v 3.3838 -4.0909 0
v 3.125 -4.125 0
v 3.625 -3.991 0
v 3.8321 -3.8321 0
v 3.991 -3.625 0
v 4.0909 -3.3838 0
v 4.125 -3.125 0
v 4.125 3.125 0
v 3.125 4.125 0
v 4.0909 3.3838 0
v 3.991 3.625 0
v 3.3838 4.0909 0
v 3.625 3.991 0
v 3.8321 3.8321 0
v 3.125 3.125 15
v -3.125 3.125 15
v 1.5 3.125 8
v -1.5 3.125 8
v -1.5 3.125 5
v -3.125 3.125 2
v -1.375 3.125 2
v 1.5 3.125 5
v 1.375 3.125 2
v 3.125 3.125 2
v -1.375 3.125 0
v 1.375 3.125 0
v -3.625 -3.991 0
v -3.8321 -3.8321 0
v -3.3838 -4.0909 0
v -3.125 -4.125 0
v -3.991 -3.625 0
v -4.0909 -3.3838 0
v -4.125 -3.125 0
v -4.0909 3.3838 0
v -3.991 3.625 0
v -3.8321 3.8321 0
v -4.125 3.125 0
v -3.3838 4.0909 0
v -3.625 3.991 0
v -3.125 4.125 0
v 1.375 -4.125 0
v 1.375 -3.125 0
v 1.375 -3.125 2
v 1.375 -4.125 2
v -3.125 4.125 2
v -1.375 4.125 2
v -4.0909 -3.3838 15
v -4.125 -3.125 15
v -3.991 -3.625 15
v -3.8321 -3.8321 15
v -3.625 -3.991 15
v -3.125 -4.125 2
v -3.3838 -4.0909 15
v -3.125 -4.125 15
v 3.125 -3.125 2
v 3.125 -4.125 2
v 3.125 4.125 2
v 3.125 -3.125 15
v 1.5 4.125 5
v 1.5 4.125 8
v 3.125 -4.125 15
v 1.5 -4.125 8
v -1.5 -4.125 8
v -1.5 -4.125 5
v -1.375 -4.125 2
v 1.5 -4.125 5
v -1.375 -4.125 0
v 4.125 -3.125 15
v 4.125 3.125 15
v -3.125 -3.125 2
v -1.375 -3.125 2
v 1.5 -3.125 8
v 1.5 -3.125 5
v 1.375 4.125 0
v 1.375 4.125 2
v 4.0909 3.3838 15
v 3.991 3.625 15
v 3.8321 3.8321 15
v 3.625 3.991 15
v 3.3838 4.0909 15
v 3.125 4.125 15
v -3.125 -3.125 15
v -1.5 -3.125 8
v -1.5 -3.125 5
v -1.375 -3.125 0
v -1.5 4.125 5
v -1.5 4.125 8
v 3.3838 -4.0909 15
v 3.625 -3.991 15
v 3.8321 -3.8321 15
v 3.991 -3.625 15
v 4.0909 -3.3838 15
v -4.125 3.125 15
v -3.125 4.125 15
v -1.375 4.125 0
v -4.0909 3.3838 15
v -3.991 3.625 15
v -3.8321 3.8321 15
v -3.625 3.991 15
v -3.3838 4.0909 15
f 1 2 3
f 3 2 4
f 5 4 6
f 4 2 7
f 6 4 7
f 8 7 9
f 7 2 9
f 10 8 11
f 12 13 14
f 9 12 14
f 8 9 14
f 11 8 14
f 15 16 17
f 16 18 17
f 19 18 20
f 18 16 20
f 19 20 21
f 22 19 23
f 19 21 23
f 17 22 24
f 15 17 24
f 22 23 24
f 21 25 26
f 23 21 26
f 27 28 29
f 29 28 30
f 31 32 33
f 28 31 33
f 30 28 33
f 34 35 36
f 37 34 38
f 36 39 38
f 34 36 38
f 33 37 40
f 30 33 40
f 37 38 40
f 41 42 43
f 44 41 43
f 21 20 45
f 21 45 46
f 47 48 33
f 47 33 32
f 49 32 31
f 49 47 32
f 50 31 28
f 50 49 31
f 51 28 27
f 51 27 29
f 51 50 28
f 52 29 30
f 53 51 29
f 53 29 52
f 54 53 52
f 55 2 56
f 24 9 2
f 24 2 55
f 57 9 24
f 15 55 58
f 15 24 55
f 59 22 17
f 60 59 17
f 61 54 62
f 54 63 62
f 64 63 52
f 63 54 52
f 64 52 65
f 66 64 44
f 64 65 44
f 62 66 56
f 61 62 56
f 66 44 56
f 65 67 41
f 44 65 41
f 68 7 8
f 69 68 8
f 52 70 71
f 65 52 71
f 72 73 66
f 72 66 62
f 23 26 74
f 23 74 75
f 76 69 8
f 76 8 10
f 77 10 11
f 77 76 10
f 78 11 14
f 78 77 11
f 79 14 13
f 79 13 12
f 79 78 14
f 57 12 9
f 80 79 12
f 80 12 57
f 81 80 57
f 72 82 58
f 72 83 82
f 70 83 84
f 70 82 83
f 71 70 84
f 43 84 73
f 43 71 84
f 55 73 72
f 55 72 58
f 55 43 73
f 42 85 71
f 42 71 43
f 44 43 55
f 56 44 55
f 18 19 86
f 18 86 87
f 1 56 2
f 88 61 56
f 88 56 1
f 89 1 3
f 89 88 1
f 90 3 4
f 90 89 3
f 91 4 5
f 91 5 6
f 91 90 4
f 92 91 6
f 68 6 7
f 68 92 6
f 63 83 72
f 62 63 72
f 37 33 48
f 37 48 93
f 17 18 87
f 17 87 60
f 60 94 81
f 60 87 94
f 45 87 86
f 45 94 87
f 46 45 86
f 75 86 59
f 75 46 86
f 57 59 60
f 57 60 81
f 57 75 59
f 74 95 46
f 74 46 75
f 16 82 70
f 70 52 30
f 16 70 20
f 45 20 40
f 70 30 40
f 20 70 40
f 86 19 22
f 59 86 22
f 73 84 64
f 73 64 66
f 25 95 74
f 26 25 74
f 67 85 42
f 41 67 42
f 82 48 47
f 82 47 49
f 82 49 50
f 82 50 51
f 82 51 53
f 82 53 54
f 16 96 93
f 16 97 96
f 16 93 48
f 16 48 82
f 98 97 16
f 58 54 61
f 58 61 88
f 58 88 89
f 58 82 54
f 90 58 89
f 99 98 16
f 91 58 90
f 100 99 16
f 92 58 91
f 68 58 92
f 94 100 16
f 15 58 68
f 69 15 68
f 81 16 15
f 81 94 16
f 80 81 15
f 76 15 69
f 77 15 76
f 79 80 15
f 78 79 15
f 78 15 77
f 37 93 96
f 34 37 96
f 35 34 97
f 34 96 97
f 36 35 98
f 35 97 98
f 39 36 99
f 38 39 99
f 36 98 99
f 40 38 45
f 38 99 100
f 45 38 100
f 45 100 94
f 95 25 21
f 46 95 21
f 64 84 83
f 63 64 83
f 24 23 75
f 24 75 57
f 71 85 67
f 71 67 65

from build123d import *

# Parameters (mm, degrees)
SKETCH029_W          = 6.25
SKETCH029_H          = 6.25
PAD018_DEPTH         = 15
THICKNESS005_T       = 1
SKETCH030_W          = 1.75
SKETCH030_H          = 2
SKETCH030_W_2        = 3
SKETCH030_H_2        = 3
POCKET006_DEPTH      = 1.126
POCKET006_DEPTH_BACK = 7.126


with BuildPart() as part:
    # Sketch029 → Pad018 (new body)
    with BuildSketch(Plane.XY):
        Rectangle(SKETCH029_W, SKETCH029_H)
    extrude(amount=PAD018_DEPTH)

    # Thickness005
    thickness005_openings = [part.faces().sort_by_distance(p)[0] for p in [
        (0, 0, 15),
        (0, 0, 0),
    ]]
    offset(amount=THICKNESS005_T, openings=thickness005_openings)

    # Sketch030 → Pocket006 (cut, two sides)
    with BuildSketch(Plane.XZ.offset(3)) as pocket006_sk:
        with Locations((-2.25, 1)):
            Rectangle(SKETCH030_W, SKETCH030_H)
        with Locations((2.25, 1)):
            Rectangle(SKETCH030_W, SKETCH030_H)
        with Locations((0, 6.5)):
            Rectangle(SKETCH030_W_2, SKETCH030_H_2)
    extrude(amount=POCKET006_DEPTH, mode=Mode.SUBTRACT)
    extrude(pocket006_sk.sketch, amount=-POCKET006_DEPTH_BACK, mode=Mode.SUBTRACT)


solid = part.part
